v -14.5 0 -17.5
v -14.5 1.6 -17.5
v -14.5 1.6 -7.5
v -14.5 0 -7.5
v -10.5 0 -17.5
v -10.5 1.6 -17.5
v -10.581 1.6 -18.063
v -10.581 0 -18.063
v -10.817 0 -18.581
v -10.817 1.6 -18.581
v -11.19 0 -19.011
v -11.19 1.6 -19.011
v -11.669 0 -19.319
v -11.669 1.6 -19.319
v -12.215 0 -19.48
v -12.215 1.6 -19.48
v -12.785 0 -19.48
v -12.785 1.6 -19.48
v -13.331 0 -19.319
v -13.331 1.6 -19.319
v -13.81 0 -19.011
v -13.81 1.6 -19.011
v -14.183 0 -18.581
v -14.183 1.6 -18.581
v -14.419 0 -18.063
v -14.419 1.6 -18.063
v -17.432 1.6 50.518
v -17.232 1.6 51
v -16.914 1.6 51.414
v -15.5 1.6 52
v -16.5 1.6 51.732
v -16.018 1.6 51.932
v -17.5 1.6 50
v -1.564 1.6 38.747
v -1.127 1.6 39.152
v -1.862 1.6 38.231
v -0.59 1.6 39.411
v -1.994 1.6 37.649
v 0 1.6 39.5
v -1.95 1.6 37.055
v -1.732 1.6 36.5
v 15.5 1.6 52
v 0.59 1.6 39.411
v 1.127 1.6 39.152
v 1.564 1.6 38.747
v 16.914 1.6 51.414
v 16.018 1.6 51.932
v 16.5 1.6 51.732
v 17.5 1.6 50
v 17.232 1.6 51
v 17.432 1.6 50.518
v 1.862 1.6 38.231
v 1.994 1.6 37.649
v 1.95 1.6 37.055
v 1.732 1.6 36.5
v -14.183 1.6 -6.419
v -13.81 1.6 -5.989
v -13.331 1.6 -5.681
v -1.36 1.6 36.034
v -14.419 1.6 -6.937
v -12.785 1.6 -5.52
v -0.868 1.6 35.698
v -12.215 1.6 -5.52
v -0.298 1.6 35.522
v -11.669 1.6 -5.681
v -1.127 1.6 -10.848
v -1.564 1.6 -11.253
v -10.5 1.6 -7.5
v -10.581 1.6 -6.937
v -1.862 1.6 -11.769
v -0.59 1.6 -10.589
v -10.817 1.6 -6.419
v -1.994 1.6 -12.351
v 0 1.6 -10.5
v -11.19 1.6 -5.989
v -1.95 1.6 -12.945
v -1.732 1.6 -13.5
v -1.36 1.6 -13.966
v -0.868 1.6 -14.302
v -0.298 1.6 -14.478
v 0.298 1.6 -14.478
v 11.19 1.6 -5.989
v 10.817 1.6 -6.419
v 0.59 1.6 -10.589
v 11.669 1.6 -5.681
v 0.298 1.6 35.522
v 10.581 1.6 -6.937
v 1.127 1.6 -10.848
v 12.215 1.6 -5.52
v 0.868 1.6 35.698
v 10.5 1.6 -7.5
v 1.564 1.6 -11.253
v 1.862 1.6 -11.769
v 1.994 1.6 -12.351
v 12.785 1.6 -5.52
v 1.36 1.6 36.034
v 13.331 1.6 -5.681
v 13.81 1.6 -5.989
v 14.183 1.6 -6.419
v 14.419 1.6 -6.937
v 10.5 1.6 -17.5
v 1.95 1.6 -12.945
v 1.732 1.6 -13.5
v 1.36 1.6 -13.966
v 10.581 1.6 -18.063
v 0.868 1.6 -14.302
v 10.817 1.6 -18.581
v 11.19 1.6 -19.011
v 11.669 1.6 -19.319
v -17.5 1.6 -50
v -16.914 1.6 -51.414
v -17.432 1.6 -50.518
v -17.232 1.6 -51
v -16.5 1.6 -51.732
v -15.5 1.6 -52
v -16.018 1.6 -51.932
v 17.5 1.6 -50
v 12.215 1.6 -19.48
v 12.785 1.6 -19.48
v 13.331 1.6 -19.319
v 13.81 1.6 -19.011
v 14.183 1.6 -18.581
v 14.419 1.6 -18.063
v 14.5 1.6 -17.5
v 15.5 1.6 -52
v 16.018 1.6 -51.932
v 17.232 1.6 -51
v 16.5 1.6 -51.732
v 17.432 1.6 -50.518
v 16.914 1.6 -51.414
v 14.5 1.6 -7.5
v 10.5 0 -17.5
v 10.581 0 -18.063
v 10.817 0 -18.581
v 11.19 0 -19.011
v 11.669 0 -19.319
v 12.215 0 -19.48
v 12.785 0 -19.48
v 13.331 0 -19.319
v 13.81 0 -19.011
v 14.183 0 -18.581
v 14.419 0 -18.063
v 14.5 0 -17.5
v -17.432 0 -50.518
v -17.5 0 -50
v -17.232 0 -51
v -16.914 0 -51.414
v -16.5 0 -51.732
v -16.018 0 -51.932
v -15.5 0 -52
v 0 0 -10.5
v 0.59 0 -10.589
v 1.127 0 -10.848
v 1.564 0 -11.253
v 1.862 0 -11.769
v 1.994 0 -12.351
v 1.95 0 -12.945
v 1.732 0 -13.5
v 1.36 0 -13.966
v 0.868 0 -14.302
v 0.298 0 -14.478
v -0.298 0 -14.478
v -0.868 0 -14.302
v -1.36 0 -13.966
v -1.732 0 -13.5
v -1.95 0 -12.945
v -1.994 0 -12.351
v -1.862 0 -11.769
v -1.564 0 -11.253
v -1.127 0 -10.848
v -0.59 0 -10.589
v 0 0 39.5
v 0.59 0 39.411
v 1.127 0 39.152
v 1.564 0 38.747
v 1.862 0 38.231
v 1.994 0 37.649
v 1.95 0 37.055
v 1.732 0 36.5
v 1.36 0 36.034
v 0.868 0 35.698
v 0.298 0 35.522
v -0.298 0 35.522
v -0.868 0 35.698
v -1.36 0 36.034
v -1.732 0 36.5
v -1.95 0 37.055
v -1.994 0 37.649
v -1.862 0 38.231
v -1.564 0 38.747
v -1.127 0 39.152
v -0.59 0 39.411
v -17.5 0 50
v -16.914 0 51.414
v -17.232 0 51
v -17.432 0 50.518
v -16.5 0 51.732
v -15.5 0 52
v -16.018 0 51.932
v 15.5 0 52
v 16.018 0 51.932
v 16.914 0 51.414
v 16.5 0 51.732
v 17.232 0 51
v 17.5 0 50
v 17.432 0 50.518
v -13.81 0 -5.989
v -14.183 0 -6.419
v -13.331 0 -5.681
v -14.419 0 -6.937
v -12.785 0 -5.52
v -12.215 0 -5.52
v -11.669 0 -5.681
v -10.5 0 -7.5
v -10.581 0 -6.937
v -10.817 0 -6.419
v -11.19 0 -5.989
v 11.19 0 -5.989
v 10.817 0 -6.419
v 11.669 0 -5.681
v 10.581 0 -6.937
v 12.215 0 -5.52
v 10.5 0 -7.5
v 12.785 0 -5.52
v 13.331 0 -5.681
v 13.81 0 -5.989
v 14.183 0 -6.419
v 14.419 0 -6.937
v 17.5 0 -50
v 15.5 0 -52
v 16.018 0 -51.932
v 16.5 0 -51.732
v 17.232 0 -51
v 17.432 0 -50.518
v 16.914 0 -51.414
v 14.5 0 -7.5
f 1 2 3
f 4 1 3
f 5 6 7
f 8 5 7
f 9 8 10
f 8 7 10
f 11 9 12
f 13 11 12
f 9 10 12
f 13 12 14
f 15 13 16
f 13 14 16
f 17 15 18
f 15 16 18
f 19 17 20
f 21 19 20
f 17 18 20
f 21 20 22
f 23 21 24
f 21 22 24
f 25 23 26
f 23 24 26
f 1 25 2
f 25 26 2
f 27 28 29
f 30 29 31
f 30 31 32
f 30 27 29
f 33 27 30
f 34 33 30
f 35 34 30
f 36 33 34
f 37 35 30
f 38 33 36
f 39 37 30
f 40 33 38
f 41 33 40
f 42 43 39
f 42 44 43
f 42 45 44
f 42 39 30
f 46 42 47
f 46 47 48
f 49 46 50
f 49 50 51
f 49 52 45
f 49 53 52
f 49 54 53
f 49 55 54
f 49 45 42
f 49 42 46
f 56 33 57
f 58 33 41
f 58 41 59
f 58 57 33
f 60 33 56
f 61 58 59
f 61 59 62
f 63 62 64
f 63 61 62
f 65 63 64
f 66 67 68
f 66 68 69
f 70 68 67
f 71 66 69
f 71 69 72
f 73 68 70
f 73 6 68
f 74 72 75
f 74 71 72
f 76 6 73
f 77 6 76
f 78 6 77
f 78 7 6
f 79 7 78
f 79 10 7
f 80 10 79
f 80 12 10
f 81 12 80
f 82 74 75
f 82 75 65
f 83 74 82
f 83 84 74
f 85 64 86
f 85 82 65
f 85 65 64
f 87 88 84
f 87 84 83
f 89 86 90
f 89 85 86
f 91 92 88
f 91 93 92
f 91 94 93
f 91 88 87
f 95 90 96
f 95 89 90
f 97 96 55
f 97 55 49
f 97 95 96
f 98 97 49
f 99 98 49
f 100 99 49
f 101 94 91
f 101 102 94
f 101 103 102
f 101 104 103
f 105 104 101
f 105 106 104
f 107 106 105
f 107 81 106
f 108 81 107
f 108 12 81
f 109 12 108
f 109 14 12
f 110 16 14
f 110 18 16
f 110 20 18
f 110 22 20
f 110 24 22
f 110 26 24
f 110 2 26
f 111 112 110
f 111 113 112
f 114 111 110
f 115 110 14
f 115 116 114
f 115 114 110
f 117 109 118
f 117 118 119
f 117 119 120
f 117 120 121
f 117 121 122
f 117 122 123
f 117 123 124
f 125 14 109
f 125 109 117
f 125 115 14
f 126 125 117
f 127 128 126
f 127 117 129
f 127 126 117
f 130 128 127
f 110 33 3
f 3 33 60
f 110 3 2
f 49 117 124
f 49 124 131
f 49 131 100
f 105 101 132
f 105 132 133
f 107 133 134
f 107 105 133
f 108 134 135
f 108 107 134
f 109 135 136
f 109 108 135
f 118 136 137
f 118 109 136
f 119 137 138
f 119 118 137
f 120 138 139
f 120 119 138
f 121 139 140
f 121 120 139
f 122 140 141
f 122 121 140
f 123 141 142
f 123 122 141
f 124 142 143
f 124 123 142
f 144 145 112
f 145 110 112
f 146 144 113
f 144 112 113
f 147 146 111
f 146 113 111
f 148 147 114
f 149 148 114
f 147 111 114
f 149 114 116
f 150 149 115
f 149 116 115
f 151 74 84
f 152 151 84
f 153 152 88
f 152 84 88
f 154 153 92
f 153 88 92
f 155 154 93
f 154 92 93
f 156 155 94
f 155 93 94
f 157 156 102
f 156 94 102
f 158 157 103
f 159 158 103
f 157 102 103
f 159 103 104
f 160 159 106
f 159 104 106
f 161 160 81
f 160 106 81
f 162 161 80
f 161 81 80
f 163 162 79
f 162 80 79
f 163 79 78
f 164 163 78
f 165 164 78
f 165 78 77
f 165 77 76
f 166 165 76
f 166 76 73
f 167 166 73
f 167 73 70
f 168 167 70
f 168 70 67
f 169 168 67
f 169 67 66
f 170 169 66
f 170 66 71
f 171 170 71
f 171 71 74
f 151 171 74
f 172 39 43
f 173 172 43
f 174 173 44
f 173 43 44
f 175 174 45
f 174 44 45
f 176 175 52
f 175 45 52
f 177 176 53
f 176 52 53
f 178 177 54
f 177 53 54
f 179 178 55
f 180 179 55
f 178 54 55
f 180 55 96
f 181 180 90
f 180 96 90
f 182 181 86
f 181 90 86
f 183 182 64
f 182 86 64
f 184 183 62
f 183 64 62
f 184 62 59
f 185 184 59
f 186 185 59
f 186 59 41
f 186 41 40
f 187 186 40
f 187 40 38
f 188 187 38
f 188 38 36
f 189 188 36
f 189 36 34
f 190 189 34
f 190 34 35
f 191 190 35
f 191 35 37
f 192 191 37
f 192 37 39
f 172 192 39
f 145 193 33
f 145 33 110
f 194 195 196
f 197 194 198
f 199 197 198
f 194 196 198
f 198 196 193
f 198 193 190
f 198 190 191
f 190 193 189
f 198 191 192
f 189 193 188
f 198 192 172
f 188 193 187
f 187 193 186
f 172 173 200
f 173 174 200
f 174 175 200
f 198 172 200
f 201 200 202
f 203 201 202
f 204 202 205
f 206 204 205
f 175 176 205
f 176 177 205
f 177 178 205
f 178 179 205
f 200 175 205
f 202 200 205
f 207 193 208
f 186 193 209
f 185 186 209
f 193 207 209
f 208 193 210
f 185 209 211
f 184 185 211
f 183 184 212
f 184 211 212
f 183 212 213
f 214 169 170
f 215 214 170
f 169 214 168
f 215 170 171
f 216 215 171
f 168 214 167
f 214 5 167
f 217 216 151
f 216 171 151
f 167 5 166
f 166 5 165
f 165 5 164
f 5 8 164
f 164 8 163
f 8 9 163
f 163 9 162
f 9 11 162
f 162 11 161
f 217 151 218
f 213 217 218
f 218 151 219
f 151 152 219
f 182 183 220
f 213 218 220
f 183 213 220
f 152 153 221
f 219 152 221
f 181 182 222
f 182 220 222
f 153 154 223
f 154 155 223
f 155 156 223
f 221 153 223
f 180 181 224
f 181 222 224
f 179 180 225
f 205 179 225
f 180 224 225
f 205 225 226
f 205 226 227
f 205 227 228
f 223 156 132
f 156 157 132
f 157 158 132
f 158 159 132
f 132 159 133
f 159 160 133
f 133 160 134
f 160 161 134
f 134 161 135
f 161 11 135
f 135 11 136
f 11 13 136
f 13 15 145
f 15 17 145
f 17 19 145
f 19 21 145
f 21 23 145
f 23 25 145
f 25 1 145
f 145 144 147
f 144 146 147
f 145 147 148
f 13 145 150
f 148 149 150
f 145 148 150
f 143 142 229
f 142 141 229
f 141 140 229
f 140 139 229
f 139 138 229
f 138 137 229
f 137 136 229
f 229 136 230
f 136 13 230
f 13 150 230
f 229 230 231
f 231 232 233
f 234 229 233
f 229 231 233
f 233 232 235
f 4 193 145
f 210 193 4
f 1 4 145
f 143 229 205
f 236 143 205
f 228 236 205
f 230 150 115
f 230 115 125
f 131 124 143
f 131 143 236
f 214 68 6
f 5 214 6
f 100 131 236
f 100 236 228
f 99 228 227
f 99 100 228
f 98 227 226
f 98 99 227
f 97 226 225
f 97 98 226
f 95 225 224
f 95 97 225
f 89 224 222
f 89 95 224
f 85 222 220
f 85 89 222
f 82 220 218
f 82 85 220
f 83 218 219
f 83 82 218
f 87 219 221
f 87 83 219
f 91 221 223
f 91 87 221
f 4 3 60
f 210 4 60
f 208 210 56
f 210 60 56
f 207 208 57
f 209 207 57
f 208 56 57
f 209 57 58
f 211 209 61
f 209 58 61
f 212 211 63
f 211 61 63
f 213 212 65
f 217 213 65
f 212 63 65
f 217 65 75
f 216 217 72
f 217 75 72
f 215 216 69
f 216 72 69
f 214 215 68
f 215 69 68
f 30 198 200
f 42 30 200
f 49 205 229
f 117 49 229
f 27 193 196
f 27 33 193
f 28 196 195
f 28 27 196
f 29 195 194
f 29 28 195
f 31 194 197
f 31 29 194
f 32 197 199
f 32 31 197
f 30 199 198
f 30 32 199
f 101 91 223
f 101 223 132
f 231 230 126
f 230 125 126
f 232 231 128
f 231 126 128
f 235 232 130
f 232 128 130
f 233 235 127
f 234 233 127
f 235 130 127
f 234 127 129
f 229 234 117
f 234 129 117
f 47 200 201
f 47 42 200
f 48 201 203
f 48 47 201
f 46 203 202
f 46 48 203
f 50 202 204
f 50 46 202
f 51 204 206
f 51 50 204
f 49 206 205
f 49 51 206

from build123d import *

# Parameters (mm, degrees)
SKETCH_1_W          = 35
SKETCH_1_H          = 104
EXTRUDE_1_DEPTH     = 1.6
SKETCH_3_R          = 2
CUT_EXTRUDE_1_DEPTH = 55.88906995
CUT_EXTRUDE_2_DEPTH = 55.88906995
FILLET_1_R          = 2


with BuildPart() as part:
    # 草图1 → 凸台-拉伸1 (new body)
    with BuildSketch(Plane(origin=(0, 0, 0), x_dir=(1, 0, 0), z_dir=(0, 1, 0))):
        Rectangle(SKETCH_1_W, SKETCH_1_H)
    extrude(amount=EXTRUDE_1_DEPTH)

    # 草图3 → 切除-拉伸1 (cut, through all)
    with BuildSketch(Plane(origin=(0, 1.6, 0), x_dir=(1, 0, 0), z_dir=(0, 1, 0))):
        with Locations(Location((0, 12.5, 0), (0, 0, 270))):
            Circle(SKETCH_3_R)
        with Locations(Location((0, -37.5, 0), (0, 0, 270))):
            Circle(SKETCH_3_R)
    extrude(amount=-CUT_EXTRUDE_1_DEPTH, mode=Mode.SUBTRACT)

    # 草图4 → 切除-拉伸2 (cut, through all)
    with BuildSketch(Plane(origin=(0, 1.6, 0), x_dir=(1, 0, 0), z_dir=(0, 1, 0))):
        with BuildLine():
            Line((10.5, 7.5), (10.5, 17.5))
            ThreePointArc((10.5, 17.5), (12.5, 19.5), (14.5, 17.5))
            Line((14.5, 17.5), (14.5, 7.5))
            ThreePointArc((14.5, 7.5), (12.5, 5.5), (10.5, 7.5))
        make_face()
        with BuildLine():
            Line((-10.5, 7.5), (-10.5, 17.5))
            ThreePointArc((-10.5, 17.5), (-12.5, 19.5), (-14.5, 17.5))
            Line((-14.5, 17.5), (-14.5, 7.5))
            ThreePointArc((-14.5, 7.5), (-12.5, 5.5), (-10.5, 7.5))
        make_face()
    extrude(amount=-CUT_EXTRUDE_2_DEPTH, mode=Mode.SUBTRACT)

    # 圆角1
    fillet_1_edges = [part.edges().sort_by_distance(p)[0] for p in [
        (17.5, 0.8, 52),
        (-17.5, 0.8, 52),
        (-17.5, 0.8, -52),
        (17.5, 0.8, -52),
    ]]
    fillet(fillet_1_edges, radius=FILLET_1_R)


solid = part.part
